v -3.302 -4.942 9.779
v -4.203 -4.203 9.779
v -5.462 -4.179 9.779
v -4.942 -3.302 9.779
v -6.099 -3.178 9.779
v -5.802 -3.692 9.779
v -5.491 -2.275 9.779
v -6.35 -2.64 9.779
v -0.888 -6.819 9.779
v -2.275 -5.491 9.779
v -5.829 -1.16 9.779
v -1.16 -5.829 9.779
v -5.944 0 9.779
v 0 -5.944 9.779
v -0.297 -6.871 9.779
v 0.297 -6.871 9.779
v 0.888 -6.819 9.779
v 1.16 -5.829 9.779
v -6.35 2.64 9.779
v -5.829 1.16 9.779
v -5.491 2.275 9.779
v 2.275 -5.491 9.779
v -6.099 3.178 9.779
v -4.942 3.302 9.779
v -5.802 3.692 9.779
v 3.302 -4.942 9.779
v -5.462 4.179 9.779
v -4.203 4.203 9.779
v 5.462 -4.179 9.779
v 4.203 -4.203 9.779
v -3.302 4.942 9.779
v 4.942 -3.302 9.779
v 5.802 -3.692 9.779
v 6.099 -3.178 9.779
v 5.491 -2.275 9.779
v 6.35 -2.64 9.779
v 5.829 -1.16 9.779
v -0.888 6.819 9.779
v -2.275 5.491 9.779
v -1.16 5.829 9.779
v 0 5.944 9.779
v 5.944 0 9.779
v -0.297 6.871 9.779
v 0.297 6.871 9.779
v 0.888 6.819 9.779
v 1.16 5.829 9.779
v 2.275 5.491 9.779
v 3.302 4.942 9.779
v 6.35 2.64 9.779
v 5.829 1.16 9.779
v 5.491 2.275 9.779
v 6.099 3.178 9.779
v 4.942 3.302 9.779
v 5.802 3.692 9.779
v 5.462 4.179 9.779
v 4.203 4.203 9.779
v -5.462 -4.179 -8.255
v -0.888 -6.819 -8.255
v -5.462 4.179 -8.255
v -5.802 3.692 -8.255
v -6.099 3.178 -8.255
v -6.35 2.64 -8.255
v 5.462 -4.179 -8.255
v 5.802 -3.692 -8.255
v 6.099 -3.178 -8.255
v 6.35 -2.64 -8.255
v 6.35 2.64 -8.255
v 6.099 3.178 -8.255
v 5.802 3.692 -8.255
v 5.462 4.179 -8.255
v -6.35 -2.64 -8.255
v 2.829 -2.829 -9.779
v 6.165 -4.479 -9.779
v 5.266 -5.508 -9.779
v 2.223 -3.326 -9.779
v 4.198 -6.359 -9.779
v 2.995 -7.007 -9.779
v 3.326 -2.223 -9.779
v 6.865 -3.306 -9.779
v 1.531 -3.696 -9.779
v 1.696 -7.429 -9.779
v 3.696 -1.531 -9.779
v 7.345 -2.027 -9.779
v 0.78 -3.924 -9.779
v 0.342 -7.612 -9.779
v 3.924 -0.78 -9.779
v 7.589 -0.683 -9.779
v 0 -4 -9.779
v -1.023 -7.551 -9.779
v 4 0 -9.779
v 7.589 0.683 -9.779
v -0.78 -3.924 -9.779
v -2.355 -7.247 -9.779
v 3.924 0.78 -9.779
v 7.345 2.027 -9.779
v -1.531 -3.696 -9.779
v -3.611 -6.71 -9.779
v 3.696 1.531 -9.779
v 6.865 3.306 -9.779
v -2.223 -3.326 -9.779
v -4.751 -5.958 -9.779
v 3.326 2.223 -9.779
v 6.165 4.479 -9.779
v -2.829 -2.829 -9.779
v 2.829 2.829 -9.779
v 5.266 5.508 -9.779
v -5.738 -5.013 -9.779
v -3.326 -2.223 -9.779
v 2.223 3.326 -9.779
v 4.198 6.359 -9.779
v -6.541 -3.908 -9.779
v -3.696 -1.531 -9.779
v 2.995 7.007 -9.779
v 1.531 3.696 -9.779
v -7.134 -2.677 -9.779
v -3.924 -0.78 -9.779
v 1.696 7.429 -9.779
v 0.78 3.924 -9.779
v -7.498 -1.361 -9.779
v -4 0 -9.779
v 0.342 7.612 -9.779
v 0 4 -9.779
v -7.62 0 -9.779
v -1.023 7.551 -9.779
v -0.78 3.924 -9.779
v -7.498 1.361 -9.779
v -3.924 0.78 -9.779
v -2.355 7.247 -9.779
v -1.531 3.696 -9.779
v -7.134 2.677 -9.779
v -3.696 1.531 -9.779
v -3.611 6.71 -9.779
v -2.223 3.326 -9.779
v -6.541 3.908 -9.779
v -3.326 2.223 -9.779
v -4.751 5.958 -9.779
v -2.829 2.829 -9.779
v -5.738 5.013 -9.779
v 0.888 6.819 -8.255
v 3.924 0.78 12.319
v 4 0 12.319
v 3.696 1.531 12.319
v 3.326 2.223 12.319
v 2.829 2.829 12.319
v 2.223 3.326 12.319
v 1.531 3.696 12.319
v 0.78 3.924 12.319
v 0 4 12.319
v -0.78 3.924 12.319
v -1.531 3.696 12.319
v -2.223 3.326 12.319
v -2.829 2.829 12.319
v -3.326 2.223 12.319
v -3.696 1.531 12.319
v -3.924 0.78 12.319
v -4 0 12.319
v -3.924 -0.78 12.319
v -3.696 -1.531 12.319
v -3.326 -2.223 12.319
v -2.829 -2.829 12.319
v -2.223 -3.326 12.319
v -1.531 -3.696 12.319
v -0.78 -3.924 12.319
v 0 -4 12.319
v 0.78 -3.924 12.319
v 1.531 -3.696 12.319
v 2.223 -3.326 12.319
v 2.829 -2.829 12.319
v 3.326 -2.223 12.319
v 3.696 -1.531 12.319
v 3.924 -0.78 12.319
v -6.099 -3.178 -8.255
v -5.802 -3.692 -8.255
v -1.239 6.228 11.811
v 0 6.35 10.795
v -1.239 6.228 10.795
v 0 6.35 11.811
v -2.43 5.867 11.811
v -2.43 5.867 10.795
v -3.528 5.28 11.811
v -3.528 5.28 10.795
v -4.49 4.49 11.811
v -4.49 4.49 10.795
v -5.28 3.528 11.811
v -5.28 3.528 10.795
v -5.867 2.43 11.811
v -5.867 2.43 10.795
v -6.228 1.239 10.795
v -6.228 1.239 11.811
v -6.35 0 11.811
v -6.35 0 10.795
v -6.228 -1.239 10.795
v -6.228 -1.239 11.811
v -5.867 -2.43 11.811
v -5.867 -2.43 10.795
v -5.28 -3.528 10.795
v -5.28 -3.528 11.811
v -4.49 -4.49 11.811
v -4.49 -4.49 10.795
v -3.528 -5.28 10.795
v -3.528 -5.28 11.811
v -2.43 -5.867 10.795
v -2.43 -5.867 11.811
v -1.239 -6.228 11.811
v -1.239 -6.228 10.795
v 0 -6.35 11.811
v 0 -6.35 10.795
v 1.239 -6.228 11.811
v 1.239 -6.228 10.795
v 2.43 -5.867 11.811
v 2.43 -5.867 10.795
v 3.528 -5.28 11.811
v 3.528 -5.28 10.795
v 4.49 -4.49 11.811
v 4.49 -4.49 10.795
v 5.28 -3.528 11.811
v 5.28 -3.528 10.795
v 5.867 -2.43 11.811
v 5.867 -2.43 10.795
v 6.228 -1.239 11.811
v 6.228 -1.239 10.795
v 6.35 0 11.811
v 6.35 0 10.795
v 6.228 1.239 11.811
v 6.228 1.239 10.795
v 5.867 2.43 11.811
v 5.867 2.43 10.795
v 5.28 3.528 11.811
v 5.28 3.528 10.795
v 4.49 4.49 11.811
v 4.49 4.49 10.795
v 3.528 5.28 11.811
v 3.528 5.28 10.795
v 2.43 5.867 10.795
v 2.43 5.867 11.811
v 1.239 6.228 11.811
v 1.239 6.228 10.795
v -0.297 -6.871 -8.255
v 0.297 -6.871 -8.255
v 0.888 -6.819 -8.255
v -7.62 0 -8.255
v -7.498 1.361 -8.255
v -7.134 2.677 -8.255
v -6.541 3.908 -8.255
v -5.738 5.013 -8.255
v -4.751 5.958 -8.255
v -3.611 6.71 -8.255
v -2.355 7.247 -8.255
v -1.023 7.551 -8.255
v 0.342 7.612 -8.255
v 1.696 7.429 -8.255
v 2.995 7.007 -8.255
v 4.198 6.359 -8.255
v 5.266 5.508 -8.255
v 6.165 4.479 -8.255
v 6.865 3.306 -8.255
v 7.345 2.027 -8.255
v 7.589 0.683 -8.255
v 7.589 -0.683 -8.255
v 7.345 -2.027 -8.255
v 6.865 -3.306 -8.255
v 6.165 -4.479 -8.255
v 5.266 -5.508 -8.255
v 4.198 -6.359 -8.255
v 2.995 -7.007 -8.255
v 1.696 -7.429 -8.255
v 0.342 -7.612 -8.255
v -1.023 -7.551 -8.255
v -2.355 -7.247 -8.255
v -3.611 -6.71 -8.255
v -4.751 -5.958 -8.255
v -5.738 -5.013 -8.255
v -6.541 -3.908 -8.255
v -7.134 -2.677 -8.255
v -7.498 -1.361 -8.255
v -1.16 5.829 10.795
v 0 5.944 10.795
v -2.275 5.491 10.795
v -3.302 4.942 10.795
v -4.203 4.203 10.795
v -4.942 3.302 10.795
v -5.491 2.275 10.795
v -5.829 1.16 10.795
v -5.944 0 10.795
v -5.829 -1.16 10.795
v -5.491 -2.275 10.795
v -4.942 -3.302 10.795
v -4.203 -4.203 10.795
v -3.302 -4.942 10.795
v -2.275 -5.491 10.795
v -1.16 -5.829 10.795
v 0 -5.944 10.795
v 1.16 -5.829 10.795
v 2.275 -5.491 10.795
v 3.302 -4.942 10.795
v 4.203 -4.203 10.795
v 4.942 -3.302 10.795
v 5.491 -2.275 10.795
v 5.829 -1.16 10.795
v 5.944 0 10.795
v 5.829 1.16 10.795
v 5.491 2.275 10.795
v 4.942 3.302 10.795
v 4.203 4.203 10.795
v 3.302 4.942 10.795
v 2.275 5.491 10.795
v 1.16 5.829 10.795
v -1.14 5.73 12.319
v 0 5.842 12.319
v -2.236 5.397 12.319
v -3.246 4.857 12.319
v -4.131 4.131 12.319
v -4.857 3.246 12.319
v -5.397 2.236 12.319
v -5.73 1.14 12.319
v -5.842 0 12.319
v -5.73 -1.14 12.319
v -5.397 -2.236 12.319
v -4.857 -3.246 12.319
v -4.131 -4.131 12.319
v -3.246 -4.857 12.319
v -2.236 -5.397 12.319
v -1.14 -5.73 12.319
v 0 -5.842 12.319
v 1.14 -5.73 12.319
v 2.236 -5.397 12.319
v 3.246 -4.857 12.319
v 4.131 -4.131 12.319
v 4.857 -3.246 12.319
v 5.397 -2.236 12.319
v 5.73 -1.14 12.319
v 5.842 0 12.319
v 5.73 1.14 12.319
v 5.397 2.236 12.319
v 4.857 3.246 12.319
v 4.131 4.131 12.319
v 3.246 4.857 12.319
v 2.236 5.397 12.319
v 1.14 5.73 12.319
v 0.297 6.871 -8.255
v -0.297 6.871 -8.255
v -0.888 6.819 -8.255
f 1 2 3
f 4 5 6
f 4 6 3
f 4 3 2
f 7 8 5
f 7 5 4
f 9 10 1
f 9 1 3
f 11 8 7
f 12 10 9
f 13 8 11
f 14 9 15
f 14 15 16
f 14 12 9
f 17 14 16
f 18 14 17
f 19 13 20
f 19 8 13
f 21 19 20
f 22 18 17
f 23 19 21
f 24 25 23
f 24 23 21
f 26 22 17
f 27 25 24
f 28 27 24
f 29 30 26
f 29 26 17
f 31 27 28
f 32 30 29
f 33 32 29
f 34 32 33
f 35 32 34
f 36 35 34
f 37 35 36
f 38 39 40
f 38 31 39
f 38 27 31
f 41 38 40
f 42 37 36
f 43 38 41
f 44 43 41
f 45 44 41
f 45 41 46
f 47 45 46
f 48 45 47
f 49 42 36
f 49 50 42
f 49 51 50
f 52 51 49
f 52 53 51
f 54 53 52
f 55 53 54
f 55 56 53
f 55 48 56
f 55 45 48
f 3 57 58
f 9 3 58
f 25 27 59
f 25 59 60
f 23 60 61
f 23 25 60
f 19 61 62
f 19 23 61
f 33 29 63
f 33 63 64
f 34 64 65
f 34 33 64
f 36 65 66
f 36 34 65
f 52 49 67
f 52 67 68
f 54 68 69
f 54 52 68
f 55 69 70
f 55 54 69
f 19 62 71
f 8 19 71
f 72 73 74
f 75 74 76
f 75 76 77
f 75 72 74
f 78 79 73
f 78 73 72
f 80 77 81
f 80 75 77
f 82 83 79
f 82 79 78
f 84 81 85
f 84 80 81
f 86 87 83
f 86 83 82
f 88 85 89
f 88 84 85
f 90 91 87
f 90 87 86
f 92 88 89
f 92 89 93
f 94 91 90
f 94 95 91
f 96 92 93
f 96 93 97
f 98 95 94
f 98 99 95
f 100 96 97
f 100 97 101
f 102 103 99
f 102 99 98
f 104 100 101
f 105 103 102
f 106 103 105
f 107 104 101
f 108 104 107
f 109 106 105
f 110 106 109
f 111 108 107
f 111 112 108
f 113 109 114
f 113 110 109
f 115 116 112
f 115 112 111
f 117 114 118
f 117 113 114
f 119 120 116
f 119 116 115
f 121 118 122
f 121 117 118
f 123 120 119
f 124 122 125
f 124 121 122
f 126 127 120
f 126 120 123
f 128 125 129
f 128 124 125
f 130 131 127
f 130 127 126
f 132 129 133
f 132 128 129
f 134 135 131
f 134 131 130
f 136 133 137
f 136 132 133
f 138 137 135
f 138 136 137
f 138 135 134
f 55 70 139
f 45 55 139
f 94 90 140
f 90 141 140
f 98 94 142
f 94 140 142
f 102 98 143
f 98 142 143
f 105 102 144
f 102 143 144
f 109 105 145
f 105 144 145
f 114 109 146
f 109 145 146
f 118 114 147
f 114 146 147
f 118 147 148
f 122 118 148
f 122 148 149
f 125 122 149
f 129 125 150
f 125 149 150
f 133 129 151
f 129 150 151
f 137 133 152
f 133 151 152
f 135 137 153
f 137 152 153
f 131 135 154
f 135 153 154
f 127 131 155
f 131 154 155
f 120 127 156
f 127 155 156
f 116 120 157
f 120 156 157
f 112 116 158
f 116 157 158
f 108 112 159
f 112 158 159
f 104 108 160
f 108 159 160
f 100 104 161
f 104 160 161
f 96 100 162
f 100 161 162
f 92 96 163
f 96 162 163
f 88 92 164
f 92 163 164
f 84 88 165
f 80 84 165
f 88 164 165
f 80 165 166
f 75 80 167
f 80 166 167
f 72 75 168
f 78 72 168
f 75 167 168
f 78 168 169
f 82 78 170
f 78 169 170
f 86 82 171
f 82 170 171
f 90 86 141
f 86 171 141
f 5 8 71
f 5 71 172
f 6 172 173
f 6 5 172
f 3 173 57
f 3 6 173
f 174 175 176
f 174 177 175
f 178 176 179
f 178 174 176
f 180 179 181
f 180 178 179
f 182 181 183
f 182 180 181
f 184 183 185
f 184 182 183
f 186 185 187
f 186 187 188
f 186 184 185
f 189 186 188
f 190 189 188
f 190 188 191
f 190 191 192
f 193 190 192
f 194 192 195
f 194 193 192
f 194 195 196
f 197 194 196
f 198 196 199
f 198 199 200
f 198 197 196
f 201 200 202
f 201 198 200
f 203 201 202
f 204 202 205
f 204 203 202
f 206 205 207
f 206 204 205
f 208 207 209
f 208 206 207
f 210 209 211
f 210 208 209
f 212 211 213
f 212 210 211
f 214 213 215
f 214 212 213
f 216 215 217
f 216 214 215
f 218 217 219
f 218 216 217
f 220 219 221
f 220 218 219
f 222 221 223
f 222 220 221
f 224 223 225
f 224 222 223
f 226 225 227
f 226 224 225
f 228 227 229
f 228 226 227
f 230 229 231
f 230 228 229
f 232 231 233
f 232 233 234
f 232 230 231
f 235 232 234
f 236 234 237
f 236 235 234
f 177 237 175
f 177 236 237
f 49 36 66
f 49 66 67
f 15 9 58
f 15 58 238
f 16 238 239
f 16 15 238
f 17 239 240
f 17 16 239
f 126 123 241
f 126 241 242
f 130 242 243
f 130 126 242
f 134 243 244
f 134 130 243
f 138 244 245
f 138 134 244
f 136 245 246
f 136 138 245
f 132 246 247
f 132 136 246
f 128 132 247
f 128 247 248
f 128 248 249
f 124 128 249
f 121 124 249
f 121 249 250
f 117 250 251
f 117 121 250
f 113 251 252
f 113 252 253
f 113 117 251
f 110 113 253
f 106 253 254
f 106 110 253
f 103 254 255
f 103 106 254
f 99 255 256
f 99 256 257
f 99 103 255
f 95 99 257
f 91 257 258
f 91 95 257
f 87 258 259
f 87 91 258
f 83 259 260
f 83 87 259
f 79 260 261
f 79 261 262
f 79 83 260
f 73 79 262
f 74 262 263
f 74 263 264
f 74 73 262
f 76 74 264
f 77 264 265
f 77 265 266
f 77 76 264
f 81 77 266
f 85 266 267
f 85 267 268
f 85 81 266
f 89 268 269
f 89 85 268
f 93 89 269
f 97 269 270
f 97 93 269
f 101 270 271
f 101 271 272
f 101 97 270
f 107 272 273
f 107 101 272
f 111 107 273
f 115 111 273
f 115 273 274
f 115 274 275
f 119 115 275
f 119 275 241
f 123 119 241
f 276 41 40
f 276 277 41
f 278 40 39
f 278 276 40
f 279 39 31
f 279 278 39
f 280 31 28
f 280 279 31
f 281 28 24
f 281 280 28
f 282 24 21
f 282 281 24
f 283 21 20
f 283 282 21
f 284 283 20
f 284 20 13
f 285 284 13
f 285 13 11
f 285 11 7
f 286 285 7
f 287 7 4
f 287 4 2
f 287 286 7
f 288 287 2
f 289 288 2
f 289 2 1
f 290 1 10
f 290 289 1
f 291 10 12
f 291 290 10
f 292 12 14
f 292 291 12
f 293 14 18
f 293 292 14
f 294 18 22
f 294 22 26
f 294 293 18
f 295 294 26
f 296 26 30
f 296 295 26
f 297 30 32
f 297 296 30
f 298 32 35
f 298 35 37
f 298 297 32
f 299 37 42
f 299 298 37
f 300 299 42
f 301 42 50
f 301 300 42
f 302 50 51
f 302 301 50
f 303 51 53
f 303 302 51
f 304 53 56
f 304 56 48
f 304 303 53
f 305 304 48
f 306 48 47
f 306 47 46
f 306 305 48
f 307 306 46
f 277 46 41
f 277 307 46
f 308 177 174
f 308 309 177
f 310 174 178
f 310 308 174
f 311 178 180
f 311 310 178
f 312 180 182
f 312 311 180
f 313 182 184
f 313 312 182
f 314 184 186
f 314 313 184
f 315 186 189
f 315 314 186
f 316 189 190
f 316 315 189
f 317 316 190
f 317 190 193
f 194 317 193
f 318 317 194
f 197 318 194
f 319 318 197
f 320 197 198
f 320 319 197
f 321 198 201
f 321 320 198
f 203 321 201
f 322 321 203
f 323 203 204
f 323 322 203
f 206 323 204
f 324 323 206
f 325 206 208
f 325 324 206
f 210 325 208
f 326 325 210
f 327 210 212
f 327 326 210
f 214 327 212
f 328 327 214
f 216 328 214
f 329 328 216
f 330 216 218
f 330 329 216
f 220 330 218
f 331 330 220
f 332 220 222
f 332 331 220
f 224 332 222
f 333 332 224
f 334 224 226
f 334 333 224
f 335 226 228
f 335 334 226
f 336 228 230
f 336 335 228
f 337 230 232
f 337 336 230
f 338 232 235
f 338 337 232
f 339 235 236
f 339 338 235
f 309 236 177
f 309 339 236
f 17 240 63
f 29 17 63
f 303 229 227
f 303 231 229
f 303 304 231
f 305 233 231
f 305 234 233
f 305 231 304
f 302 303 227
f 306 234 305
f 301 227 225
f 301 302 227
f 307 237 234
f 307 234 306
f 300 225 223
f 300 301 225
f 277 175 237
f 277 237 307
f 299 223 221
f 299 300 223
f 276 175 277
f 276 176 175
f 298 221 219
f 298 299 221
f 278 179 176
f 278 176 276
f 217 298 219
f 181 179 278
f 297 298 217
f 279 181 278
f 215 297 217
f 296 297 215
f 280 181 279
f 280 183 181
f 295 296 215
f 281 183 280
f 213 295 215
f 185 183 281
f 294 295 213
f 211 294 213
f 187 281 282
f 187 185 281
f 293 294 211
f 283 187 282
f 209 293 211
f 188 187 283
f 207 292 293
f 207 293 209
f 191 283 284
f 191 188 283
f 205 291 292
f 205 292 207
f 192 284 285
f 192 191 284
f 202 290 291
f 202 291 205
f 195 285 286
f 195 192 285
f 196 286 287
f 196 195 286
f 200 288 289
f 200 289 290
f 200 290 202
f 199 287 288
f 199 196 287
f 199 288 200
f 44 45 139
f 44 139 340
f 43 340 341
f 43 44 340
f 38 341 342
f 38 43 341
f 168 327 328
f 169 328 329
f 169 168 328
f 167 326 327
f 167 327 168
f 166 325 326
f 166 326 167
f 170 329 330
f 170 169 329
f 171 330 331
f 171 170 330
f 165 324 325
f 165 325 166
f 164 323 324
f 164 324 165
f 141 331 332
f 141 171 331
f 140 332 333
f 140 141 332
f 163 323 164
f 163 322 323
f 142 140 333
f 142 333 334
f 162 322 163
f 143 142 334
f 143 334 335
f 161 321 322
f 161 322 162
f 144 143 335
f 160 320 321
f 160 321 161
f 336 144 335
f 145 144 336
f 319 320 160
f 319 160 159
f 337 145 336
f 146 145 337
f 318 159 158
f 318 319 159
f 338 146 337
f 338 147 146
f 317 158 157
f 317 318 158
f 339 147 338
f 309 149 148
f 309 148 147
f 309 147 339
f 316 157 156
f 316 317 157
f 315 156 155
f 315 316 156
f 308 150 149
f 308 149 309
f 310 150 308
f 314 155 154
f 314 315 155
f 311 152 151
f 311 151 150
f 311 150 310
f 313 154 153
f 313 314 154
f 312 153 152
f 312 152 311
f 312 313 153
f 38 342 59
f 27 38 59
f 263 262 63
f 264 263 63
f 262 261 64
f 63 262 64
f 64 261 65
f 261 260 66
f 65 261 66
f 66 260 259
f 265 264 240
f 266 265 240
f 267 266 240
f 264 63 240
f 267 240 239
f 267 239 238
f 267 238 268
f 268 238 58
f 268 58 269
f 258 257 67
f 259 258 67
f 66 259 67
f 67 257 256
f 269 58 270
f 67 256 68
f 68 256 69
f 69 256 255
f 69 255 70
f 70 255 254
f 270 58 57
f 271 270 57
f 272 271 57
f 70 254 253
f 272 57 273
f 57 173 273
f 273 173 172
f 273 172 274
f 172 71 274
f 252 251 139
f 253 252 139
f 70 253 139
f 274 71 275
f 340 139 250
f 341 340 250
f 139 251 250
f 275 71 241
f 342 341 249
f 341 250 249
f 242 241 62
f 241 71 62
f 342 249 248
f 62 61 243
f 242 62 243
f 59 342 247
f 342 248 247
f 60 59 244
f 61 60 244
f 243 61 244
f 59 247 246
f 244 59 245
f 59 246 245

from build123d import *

# Parameters (mm, degrees)
SKETCH1_R               = 6.35
BASIC_ROD_DEPTH         = 9.779
BASIC_ROD_DEPTH_BACK    = 9.779
THEX_DEPTH              = 9.779
SKETCH2_R               = 4.0005
INTERNAL_CUT_DEPTH      = 13.319
INTERNAL_CUT_DEPTH_BACK = 10.779
SKETCH9_R               = 7.62
SKETCH9_R_2             = 4.0005
BOSS_EXTRUDE1_DEPTH     = 1.524


with BuildPart() as part:
    # Sketch1 → Basic Rod (new body, two sides)
    with BuildSketch(Plane.XY) as basic_rod_sk:
        Circle(SKETCH1_R)
    extrude(amount=BASIC_ROD_DEPTH)
    extrude(basic_rod_sk.sketch, amount=-BASIC_ROD_DEPTH_BACK)

    # Sketch8 → THex (add, symmetric)
    with BuildSketch(Plane.XY):
        with BuildLine():
            Line((-0.888411378, 6.819423871), (-5.461588622, 4.179098758))
            ThreePointArc((-5.461588622, 4.179098758), (-5.955700003, 3.438525), (-6.35, 2.640325113))
            Line((-6.35, 2.640325113), (-6.35, -2.640325113))
            ThreePointArc((-6.35, -2.640325113), (-5.955700003, -3.438525), (-5.461588622, -4.179098758))
            Line((-5.461588622, -4.179098758), (-0.888411378, -6.819423871))
            ThreePointArc((-0.888411378, -6.819423871), (0, -6.87705), (0.888411378, -6.819423871))
            Line((0.888411378, -6.819423871), (5.461588622, -4.179098758))
            ThreePointArc((5.461588622, -4.179098758), (5.955700003, -3.438525), (6.35, -2.640325113))
            Line((6.35, -2.640325113), (6.35, 2.640325113))
            ThreePointArc((6.35, 2.640325113), (5.955700003, 3.438525), (5.461588622, 4.179098758))
            Line((5.461588622, 4.179098758), (0.888411378, 6.819423871))
            ThreePointArc((0.888411378, 6.819423871), (0, 6.87705), (-0.888411378, 6.819423871))
        make_face()
    extrude(amount=THEX_DEPTH, both=True)

    # Sketch7 → 1stSnapRing (revolve)
    with BuildSketch(Plane(origin=(0, 0, 0), x_dir=(0, 0, -1), z_dir=(1, 0, 0))):
        Polygon((-9.779, 5.9436), (-10.795, 5.9436), (-10.795, 6.35), (-11.811, 6.35), (-12.319, 5.842), (-12.319, 0), (-9.779, 0), align=None)
    revolve(axis=Axis((0, 0, -38.2778), (0, 0, 1)))

    # Sketch2 → Internal Cut (cut, two sides)
    with BuildSketch(Plane.XY) as internal_cut_sk:
        Circle(SKETCH2_R)
    extrude(amount=INTERNAL_CUT_DEPTH, mode=Mode.SUBTRACT)
    extrude(internal_cut_sk.sketch, amount=-INTERNAL_CUT_DEPTH_BACK, mode=Mode.SUBTRACT)

    # Sketch9 → Boss-Extrude1 (add)
    with BuildSketch(Plane(origin=(0, 0, -9.779), x_dir=(-1, 0, 0), z_dir=(0, 0, -1))):
        Circle(SKETCH9_R)
        Circle(SKETCH9_R_2, mode=Mode.SUBTRACT)
    extrude(amount=-BOSS_EXTRUDE1_DEPTH)


solid = part.part
